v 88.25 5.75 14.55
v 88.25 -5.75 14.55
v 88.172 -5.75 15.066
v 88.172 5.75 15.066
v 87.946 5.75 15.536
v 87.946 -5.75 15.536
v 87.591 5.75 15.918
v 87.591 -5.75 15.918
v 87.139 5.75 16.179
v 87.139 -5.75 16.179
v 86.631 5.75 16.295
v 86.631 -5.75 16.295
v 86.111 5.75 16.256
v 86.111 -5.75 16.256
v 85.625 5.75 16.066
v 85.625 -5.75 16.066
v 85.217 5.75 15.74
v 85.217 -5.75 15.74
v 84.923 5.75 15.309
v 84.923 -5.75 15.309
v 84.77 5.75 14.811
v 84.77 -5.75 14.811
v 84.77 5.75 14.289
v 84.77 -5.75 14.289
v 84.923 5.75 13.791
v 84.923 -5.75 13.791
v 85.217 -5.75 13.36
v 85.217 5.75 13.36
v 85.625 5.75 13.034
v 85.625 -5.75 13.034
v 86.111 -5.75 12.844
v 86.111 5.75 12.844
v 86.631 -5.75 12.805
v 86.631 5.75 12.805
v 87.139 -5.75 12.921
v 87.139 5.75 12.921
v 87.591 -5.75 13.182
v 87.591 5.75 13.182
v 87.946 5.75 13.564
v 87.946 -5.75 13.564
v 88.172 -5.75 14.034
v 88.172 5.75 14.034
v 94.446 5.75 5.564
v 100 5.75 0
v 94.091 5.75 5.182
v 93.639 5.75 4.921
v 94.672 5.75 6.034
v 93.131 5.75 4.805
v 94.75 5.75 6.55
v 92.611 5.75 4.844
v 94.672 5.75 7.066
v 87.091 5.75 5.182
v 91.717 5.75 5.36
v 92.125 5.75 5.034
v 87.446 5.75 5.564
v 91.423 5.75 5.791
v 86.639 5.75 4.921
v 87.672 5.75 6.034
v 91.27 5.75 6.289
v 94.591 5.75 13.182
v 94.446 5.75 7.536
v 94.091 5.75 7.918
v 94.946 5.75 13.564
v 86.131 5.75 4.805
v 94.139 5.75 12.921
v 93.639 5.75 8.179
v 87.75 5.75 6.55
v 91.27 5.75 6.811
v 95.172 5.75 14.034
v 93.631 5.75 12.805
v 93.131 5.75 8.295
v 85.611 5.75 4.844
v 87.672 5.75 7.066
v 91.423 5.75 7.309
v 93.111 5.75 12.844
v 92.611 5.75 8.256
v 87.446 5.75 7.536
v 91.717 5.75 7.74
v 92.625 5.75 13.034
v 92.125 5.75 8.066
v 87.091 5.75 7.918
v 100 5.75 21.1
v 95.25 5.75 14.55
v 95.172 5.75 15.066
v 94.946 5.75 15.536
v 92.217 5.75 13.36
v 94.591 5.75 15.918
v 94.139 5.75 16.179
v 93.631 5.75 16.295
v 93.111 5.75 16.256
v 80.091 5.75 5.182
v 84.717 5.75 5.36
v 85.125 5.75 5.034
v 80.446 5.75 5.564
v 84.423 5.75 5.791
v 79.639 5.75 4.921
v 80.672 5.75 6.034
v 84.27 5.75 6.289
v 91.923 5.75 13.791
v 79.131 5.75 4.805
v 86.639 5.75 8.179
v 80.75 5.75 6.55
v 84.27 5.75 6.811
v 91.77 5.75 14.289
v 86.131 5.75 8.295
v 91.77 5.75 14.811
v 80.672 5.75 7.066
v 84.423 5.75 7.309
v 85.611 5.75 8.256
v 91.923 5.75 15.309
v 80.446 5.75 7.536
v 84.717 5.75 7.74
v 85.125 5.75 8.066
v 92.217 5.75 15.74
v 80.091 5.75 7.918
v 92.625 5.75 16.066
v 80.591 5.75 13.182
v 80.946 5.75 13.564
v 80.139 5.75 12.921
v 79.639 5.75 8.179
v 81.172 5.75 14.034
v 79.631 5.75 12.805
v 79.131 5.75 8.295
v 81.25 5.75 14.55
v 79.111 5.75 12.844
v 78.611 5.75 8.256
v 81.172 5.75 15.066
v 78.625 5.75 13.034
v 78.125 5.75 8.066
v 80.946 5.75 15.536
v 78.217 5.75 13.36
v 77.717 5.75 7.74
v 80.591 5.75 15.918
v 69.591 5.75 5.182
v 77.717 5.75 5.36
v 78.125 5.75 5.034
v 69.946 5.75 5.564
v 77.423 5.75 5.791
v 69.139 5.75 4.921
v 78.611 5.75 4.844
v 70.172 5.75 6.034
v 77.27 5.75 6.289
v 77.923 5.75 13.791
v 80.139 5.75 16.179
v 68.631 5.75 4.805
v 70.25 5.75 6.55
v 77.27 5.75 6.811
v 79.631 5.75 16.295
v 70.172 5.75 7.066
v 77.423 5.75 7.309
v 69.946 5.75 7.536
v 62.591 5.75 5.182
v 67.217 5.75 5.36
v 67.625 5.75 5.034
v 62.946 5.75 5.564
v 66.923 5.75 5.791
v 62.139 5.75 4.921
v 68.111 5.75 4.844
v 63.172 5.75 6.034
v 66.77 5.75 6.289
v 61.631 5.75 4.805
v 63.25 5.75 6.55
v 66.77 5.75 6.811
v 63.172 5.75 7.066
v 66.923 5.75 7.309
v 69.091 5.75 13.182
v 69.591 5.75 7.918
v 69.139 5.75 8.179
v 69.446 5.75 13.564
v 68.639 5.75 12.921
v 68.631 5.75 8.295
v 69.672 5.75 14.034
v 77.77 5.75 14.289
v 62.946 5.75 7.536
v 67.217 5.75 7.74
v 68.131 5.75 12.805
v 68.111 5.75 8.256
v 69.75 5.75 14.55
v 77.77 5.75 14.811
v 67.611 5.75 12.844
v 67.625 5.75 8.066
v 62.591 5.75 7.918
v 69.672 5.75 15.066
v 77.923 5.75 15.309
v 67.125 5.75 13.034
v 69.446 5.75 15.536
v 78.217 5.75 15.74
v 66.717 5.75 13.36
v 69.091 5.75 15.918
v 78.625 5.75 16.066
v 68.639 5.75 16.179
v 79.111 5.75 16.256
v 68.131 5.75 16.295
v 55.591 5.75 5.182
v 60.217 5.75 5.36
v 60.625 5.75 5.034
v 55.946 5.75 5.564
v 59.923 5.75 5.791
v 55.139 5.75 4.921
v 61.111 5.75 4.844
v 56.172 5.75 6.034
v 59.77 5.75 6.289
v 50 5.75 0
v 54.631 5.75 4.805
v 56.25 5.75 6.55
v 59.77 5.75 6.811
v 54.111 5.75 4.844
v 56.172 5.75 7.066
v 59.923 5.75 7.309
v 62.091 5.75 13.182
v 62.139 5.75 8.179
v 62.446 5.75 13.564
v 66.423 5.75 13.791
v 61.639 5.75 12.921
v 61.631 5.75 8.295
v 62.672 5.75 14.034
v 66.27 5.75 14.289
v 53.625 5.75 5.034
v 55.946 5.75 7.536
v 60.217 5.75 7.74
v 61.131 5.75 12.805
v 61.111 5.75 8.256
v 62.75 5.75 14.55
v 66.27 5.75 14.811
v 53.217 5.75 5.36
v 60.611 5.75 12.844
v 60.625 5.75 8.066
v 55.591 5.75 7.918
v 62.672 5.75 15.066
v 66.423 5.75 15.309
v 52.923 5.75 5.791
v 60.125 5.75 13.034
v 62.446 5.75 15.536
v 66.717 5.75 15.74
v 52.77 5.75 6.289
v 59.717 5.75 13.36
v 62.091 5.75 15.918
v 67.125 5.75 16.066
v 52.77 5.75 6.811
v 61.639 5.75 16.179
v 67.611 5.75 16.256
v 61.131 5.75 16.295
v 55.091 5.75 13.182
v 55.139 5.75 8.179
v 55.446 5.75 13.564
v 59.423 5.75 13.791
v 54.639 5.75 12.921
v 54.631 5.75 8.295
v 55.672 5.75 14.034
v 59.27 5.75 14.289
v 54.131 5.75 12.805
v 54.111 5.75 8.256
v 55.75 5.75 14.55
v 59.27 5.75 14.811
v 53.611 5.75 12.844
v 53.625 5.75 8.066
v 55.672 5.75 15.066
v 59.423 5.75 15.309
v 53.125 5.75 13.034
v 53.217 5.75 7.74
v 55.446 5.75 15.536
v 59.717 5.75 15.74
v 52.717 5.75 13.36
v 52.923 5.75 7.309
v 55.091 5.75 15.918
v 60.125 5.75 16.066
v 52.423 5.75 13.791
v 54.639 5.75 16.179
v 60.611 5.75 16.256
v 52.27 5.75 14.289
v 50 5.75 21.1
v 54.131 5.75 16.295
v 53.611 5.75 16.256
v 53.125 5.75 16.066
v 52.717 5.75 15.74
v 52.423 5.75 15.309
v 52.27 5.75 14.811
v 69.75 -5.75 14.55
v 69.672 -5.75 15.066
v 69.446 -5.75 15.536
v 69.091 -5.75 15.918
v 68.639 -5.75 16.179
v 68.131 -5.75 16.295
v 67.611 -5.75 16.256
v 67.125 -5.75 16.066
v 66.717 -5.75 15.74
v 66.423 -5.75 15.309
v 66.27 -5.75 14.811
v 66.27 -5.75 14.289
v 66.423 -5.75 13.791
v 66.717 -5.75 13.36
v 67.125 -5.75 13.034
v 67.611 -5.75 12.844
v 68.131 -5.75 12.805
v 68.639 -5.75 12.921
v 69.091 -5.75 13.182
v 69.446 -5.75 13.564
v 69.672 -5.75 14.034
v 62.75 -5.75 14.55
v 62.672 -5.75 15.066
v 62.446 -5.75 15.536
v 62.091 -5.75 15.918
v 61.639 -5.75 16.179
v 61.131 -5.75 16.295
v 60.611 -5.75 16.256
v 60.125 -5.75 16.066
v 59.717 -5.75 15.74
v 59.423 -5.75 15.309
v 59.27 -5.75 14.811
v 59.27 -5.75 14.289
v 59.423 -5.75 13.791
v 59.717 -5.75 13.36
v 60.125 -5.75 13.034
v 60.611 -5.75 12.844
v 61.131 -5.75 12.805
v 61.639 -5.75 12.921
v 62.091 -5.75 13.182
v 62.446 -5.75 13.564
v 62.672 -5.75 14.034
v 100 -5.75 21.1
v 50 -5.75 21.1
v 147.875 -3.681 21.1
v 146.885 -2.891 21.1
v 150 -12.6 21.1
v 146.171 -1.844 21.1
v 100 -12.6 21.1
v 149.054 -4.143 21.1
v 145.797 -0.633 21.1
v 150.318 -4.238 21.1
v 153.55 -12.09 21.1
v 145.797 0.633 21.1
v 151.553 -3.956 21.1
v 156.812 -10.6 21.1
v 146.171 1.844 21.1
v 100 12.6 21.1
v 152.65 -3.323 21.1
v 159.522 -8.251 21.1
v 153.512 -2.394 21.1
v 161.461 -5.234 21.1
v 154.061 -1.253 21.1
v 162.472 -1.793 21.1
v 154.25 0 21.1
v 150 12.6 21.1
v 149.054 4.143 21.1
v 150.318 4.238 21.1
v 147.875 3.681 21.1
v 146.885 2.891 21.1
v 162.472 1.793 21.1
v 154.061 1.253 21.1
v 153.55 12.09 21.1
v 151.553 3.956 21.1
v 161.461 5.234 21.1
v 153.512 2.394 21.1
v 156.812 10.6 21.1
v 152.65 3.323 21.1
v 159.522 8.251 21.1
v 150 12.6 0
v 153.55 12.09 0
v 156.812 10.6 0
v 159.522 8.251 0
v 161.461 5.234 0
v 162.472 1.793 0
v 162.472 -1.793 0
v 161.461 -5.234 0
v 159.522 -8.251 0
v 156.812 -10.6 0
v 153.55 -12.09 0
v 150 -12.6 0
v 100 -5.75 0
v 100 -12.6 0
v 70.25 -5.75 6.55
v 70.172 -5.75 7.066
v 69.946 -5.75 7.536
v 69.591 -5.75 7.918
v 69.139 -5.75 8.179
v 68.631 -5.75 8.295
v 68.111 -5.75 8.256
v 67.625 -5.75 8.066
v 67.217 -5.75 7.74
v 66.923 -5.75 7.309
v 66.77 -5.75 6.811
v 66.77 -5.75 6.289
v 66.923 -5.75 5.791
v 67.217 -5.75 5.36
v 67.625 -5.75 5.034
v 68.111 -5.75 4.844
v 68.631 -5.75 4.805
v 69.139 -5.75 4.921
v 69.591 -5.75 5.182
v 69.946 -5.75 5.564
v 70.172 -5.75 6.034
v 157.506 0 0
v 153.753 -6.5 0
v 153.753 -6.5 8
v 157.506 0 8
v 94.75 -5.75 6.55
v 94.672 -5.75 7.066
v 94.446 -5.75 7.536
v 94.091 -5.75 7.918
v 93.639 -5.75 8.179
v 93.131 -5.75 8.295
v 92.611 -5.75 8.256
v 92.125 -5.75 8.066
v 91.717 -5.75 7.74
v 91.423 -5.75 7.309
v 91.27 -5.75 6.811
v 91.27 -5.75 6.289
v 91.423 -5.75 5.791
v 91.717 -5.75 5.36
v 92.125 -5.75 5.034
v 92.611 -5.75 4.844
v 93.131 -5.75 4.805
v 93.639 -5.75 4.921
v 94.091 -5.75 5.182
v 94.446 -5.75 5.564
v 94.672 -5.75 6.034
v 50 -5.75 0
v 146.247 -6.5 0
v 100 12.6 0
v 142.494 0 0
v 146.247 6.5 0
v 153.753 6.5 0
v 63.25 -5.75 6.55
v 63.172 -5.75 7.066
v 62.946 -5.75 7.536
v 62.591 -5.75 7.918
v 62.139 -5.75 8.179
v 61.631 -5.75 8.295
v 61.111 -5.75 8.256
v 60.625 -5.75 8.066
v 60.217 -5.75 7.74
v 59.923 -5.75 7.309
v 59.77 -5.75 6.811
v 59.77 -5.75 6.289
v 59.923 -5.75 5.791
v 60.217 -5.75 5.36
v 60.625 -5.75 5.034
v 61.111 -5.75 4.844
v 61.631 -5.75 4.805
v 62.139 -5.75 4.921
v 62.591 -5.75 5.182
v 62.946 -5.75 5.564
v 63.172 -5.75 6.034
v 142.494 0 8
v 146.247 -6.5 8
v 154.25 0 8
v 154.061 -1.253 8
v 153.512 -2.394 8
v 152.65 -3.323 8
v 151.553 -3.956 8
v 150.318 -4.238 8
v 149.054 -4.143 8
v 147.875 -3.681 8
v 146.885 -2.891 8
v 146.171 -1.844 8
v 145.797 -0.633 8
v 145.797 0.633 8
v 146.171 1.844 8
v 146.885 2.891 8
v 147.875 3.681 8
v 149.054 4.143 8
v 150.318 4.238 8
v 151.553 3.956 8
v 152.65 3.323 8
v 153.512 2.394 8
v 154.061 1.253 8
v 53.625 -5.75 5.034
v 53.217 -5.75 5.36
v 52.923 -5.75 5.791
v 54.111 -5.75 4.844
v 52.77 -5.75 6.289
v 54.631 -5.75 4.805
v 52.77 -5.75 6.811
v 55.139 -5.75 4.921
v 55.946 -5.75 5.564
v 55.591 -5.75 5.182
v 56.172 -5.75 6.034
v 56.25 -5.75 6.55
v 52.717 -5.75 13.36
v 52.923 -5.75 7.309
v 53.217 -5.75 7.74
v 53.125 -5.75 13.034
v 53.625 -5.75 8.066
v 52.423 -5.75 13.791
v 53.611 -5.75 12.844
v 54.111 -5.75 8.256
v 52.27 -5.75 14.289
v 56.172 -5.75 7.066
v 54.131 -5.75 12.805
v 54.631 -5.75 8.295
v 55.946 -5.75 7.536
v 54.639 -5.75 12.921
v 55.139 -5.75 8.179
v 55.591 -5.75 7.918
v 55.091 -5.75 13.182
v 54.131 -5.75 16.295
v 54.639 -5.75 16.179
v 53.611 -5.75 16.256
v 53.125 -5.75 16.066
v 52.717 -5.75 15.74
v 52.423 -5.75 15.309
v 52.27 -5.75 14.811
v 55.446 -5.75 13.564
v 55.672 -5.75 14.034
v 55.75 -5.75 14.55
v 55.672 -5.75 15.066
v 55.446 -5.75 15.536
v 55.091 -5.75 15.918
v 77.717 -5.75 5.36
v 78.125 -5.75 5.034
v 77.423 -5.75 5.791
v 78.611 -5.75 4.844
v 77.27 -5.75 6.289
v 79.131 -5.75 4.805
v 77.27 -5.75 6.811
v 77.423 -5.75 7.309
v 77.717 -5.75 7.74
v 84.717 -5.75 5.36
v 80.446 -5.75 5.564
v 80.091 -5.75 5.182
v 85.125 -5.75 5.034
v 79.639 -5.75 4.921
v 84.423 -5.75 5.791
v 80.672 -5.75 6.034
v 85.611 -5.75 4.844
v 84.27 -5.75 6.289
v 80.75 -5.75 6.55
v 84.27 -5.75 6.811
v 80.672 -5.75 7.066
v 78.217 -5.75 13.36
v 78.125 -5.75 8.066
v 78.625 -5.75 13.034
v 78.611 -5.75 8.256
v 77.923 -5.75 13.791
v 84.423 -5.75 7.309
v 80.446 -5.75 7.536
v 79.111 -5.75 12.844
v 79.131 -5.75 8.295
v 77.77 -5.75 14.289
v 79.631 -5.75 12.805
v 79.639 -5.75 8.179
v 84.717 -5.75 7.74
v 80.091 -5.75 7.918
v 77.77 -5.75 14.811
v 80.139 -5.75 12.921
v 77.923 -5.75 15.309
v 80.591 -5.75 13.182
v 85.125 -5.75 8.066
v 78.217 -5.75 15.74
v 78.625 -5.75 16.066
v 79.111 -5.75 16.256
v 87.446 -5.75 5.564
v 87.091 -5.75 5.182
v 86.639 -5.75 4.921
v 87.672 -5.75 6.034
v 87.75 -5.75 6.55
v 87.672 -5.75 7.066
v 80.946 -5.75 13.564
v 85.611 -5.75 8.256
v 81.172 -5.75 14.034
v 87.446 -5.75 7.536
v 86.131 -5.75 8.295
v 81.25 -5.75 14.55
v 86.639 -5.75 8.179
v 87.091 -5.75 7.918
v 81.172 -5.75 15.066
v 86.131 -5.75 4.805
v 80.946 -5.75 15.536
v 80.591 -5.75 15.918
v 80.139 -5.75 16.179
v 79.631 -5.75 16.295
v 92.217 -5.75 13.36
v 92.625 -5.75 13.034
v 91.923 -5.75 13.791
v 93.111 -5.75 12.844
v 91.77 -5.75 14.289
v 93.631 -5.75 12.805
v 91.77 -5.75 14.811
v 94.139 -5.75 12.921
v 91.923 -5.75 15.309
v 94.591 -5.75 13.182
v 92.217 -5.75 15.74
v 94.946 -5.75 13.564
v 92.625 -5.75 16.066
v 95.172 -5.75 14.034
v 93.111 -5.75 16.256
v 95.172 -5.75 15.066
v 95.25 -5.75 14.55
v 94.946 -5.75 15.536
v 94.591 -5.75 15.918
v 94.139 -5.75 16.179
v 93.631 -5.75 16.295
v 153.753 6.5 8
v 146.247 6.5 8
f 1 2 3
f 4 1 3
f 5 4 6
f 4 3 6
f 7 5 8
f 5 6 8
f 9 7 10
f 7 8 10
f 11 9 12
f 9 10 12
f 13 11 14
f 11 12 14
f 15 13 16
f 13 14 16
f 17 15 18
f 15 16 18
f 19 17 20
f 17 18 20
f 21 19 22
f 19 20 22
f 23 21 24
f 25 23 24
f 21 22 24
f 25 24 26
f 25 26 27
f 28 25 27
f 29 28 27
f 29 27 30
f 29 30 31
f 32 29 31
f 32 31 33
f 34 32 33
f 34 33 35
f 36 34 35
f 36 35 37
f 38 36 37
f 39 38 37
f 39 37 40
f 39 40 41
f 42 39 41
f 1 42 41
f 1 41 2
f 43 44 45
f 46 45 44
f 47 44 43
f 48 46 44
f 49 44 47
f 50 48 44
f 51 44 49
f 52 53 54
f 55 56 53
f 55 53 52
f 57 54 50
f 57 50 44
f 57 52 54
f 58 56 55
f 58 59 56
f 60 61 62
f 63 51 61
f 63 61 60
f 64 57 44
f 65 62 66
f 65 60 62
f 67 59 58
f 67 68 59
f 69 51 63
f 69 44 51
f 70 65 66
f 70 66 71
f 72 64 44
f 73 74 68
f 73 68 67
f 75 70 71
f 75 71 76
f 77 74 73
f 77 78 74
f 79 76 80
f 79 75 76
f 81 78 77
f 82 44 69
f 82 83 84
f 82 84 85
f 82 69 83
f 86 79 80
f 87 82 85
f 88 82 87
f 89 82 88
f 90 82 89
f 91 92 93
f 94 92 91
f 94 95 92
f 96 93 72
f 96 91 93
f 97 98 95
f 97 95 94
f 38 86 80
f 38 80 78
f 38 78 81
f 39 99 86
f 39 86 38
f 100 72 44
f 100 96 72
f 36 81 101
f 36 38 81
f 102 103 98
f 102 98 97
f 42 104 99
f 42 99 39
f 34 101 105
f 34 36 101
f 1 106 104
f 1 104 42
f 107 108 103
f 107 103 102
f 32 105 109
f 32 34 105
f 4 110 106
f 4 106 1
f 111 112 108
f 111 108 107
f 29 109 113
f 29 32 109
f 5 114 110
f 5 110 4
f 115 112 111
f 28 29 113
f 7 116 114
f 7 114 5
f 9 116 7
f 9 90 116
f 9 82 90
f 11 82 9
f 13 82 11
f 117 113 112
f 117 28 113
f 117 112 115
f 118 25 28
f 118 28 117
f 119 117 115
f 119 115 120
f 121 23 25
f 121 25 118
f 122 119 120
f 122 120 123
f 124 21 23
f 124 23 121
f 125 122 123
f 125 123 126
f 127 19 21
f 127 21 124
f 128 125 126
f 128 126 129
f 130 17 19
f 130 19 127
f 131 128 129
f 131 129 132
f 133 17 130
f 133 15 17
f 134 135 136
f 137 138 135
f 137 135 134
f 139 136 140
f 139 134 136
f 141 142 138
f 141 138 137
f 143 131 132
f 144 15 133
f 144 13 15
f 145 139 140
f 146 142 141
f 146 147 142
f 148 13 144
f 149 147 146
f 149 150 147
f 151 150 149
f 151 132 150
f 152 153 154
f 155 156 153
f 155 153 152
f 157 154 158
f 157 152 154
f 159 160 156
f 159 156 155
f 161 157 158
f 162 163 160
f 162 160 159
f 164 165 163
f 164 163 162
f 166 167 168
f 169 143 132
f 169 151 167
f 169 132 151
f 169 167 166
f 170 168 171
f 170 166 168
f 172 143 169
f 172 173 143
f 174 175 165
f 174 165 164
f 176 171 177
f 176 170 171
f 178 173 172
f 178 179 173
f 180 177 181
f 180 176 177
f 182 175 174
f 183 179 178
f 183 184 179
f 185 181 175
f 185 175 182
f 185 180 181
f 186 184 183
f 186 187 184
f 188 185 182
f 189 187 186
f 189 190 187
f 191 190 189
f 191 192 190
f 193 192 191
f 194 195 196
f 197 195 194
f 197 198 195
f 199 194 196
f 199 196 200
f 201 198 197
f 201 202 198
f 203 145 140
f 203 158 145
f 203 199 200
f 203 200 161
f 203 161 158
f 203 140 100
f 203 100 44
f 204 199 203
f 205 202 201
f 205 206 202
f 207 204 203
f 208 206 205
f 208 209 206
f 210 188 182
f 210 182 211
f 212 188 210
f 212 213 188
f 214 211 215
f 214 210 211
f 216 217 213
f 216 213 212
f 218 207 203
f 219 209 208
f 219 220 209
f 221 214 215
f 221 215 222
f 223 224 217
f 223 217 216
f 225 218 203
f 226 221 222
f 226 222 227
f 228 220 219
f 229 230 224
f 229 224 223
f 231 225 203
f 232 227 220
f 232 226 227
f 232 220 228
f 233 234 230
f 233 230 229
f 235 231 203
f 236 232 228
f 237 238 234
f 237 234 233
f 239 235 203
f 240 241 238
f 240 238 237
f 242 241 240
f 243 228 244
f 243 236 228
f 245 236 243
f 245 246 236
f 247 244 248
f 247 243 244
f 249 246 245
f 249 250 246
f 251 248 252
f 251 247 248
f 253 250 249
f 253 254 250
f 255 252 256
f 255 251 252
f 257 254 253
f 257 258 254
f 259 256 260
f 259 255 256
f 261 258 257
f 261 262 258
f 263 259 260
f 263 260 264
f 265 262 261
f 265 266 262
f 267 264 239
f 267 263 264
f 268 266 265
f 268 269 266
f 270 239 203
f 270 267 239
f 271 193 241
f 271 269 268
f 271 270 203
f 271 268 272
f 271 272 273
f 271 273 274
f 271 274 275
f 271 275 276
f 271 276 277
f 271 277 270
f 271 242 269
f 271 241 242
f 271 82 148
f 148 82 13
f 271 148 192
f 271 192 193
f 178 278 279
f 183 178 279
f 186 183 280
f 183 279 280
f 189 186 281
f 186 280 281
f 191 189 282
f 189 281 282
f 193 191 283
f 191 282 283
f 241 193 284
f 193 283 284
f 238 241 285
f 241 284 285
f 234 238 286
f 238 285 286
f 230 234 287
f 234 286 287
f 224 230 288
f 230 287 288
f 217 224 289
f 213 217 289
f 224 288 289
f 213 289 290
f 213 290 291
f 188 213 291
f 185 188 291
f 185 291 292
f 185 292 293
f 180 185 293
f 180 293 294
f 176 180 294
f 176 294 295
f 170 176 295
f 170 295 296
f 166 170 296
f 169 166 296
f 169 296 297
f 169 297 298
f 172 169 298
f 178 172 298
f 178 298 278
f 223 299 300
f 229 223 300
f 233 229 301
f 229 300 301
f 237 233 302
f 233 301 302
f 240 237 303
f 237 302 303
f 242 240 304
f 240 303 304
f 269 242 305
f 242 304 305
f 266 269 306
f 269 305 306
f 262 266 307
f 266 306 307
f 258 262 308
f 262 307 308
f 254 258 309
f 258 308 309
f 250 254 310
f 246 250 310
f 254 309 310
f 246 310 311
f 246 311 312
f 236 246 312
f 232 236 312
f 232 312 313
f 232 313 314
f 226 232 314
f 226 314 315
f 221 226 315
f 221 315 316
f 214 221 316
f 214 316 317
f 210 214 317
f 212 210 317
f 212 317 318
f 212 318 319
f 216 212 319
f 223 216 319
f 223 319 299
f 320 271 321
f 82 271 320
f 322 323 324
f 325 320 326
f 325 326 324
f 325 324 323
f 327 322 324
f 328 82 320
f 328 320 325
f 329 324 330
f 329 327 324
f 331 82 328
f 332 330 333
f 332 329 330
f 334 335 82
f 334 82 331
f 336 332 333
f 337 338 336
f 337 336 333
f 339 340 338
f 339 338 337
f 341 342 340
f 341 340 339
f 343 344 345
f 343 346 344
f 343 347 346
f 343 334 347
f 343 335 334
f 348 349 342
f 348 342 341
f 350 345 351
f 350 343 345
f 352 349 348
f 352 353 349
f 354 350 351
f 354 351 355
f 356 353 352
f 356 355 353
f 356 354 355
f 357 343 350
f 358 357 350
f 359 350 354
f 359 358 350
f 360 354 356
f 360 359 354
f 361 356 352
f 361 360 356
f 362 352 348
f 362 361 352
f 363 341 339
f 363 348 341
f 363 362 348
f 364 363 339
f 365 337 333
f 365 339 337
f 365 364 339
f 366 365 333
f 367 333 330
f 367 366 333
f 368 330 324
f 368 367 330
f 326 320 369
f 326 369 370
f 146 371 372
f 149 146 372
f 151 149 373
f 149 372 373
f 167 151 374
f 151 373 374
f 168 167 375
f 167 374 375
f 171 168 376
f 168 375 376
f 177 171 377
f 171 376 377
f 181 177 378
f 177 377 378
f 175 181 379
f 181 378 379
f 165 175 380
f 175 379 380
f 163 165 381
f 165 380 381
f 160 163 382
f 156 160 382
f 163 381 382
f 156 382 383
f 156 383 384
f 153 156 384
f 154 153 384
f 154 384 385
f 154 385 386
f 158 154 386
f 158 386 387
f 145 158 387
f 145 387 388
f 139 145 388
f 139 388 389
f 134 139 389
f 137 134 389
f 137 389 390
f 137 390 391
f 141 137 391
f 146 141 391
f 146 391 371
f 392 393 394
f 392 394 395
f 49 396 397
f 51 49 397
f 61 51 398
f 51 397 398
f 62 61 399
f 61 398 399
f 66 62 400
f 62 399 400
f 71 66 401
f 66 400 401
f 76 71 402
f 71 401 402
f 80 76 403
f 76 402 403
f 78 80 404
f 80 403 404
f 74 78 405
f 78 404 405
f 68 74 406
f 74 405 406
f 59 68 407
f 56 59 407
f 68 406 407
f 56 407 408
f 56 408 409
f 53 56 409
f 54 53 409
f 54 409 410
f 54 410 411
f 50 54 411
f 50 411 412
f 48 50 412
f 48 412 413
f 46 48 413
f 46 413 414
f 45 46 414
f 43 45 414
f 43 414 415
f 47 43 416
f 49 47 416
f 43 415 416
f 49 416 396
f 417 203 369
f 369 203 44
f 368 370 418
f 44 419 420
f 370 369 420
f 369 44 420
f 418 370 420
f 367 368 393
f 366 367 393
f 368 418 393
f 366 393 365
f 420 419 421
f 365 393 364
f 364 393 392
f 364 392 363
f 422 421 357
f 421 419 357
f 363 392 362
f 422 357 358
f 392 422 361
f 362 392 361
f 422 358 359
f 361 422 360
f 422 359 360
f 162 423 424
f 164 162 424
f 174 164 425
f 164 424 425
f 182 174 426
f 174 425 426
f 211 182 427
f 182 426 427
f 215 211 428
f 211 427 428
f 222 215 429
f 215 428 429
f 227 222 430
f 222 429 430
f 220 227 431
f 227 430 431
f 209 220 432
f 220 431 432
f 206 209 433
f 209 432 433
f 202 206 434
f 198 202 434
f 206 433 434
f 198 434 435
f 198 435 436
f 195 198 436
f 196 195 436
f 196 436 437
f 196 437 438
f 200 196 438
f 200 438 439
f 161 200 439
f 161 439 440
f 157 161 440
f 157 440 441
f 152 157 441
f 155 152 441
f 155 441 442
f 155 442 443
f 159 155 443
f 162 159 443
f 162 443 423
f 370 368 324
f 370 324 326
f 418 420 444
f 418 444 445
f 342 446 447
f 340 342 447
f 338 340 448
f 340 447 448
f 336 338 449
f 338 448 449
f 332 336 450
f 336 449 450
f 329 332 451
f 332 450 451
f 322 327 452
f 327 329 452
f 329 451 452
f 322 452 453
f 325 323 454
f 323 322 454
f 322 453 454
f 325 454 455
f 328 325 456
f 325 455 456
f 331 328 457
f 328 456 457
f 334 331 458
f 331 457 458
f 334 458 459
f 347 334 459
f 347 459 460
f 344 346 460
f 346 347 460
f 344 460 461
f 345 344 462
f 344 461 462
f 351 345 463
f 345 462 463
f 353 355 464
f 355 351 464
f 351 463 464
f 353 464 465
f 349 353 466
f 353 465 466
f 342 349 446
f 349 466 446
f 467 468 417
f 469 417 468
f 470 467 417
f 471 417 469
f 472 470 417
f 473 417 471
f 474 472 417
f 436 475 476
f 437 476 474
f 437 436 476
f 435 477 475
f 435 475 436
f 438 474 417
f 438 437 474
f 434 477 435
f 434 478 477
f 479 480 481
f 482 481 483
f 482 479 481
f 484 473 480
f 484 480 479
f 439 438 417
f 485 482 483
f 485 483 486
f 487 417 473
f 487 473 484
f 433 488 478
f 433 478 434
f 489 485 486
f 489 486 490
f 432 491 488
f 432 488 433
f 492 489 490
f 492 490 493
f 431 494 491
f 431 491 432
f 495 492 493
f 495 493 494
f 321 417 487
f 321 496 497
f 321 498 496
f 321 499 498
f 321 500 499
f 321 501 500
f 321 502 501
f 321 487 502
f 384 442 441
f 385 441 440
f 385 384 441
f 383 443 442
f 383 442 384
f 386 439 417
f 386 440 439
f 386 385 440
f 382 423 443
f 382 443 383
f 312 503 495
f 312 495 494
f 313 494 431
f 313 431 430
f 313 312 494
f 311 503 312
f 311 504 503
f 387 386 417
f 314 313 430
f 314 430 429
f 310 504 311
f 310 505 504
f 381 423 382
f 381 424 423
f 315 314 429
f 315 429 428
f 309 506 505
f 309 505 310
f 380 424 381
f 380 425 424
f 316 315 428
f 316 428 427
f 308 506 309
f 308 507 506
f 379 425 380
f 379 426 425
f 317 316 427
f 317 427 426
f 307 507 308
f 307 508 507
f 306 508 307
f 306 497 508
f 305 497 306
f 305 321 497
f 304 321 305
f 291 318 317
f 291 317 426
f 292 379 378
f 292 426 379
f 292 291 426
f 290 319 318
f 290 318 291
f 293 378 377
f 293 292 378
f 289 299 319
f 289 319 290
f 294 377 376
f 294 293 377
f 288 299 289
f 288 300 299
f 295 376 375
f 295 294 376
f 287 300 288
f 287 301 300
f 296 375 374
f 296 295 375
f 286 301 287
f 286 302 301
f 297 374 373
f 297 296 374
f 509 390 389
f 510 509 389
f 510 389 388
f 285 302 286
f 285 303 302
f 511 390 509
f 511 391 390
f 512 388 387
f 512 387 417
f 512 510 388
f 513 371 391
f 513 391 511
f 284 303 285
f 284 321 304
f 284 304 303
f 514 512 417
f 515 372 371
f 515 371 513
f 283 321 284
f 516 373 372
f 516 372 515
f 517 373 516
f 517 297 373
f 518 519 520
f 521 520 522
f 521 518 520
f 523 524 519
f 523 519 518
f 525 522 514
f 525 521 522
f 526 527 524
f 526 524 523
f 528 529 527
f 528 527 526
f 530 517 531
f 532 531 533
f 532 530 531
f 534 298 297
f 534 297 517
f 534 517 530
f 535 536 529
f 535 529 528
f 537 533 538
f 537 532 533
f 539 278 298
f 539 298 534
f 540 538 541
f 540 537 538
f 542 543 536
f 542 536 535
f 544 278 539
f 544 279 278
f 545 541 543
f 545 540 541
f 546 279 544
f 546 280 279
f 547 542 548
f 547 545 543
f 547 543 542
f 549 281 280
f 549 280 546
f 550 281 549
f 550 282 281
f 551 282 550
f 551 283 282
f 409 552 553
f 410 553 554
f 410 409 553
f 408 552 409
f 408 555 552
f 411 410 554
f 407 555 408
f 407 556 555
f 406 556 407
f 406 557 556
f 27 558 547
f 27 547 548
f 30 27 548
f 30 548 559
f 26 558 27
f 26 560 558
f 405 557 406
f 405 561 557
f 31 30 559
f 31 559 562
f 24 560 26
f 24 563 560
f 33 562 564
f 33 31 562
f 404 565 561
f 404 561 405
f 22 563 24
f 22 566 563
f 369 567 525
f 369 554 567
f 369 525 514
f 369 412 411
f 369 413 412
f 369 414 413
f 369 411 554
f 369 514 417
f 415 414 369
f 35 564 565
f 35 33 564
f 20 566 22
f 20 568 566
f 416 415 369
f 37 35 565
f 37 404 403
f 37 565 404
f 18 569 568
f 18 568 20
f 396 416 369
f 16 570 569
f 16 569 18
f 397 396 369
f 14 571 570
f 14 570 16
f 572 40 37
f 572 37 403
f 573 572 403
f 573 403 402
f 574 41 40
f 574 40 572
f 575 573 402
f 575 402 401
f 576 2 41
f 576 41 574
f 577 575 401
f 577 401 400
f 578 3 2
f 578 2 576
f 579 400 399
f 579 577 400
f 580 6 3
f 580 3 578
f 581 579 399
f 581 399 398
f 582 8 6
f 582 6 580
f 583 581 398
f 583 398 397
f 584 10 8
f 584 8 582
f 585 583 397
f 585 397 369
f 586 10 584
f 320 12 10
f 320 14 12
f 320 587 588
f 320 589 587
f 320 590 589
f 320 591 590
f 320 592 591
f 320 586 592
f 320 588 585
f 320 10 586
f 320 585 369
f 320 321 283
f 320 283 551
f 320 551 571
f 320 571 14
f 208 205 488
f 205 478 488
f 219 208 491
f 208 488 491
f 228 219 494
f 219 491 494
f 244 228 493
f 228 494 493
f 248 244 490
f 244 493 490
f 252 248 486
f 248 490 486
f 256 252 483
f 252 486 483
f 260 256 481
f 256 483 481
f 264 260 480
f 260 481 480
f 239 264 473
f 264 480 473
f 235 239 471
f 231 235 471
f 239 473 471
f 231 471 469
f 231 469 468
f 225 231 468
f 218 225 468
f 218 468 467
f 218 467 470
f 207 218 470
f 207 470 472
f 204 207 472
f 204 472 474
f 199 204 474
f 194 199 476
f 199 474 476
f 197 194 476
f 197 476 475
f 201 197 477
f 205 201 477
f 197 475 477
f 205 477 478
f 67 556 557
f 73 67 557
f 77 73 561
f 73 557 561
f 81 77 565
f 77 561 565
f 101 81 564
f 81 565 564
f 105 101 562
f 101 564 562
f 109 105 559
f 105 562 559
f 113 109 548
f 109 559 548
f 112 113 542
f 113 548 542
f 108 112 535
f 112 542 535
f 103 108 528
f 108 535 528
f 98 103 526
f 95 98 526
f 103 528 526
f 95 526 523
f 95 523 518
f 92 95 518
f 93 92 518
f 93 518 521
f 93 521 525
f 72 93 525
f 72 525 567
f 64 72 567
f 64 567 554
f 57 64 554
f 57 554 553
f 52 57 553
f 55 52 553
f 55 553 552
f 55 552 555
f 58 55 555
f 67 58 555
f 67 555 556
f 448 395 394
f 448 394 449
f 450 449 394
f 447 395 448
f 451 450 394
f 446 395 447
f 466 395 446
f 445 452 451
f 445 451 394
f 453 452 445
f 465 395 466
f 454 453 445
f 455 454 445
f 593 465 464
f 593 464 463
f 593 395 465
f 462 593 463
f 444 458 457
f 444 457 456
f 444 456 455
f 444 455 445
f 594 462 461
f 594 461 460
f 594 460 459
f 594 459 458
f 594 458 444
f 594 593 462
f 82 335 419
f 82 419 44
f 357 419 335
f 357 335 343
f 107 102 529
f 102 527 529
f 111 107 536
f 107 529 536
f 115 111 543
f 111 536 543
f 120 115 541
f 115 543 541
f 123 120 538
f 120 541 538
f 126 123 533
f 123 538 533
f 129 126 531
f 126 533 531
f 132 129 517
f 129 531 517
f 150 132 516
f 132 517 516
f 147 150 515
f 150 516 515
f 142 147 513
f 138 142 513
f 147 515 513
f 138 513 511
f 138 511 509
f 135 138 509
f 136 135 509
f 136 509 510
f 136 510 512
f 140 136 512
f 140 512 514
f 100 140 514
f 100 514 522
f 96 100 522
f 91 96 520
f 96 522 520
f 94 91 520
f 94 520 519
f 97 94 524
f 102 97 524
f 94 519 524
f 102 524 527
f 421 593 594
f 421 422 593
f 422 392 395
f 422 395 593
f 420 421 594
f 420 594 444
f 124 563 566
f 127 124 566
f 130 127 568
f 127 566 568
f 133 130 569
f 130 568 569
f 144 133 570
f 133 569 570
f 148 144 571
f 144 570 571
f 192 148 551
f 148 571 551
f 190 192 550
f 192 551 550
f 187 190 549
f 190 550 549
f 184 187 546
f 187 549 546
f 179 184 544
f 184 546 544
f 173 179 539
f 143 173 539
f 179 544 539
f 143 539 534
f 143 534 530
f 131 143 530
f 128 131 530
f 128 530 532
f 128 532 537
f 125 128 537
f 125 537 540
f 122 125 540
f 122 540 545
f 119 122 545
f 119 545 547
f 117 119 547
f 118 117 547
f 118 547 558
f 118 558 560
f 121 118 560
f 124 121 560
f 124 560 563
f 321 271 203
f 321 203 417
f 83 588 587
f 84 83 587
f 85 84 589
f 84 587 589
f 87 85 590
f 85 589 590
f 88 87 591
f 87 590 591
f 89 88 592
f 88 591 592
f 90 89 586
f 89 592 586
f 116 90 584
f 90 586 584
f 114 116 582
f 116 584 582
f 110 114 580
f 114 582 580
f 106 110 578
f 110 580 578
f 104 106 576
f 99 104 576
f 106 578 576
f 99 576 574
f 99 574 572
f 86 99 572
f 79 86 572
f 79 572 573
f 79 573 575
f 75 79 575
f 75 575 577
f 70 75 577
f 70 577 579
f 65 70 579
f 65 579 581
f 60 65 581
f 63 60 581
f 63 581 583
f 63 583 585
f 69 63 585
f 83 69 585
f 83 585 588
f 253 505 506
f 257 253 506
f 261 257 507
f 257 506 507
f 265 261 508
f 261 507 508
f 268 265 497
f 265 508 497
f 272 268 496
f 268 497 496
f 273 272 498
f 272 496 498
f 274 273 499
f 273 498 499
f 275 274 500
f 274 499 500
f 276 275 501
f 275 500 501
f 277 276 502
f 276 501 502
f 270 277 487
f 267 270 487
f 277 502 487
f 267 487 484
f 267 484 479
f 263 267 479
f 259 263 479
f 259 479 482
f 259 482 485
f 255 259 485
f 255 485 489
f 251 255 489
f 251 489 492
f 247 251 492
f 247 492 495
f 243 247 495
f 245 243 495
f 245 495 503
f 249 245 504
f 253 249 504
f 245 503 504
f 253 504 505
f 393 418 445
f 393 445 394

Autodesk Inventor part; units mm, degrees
ref_plane "YZ Plane" through (0, 0, 0) normal (1, 0, 0) x (0, 1, 0)
ref_plane "XZ Plane" through (0, 0, 0) normal (0, 1, 0) x (-1, 0, 0)
ref_plane "XY Plane" through (0, 0, 0) normal (0, 0, 1) x (1, 0, 0)
sketch "Sketch1" plane through (0, 0, 0) normal (0, 0, 1) x (1, 0, 0)
  line L0 (0, 12.6) -> (150, 12.6)
  arc A0 (150, -12.6) -> (150, 12.6) centre (150, 0) ccw
  line L1 (150, -12.6) -> (0, -12.6)
  arc A1 (0, 12.6) -> (0, -12.6) centre (0, 0) ccw
  circle A2 centre (0, 0) radius 7.5
  circle A3 centre (150, 0) radius 4.25
  dimension "d0" = 150
  dimension "d2" = 12.6
  dimension "d3" = 15
  dimension "d4" = 8.5
extrude "Extrusion1" add sketch "Sketch1" along normal blind 21.1
sketch "Sketch2" plane through (0, 0, 21.1) normal (0, 0, 1) x (1, 0, 0)
  circle A0 centre (0, 0) radius 7.5 projected
  arc A1 (0, 12.6) -> (0, -12.6) centre (0, 0) ccw projected
  circle A2 centre (0, 0) radius 11
  dimension "d7" = 22
extrude "Extrusion2" cut sketch "Sketch2" against normal blind 7
sketch "Sketch4" plane through (0, 0, 21.1) normal (0, 0, 1) x (1, 0, 0)
  circle A0 centre (0, 0) radius 11 projected
  circle A1 centre (20, 0) radius 1.75
  circle A2 centre (40, 0) radius 1.75
  dimension "d16" = 20
  dimension "d17" = 40
  dimension "d23" = 3.5
extrude "Extrusion3" cut sketch "Sketch4" against normal through all contours A1 | A2
sketch "Sketch5" plane through (0, 0, 21.1) normal (0, 0, 1) x (1, 0, 0)
  circle A0 centre (20, 0) radius 1.75 projected
  circle A1 centre (40, 0) radius 1.75 projected
  circle A2 centre (40, 0) radius 3
  circle A3 centre (20, 0) radius 3
  dimension "d28" = 6
extrude "Extrusion4" cut sketch "Sketch5" against normal blind 3
sketch "Sketch6" plane through (0, 0, 21.1) normal (0, 0, 1) x (1, 0, 0)
  line L0 (150, 12.6) -> (0, 12.6) projected
  arc A0 (0, 12.6) -> (0, -12.6) centre (0, 0) ccw projected
  line L1 (0, -12.6) -> (150, -12.6) projected
  arc A1 (12.1445, 12.6) -> (12.1445, -12.6) centre (0, 0) ccw
  dimension "d24" = 35
extrude "Extrusion5" add sketch "Sketch6" against normal up to surface (21.1 mm away)
fillet "Fillet1" radius 3.5 1 edges at (-7.5, 0, 14.1)
sketch "Sketch8" plane through (0, 0, 21.1) normal (0, 0, 1) x (1, 0, 0)
  circle A0 centre (150, 0) radius 7
  line L0 (150, 12.6) -> (12.1445, 12.6)
  arc A1 (12.1445, 12.6) -> (12.1445, -12.6) centre (0, 0) ccw
  line L1 (12.1445, -12.6) -> (150, -12.6)
  line L2 (100, 12.6) -> (100, 5.75)
  line L3 (100, 5.75) -> (50, 5.75)
  line L4 (50, 5.75) -> (50, -5.75)
  line L5 (50, -5.75) -> (100, -5.75)
  line L6 (100, -5.75) -> (100, -12.6)
  circle A2 centre (40, 0) radius 3 projected
  circle A3 centre (20, 0) radius 3 projected
  circle A4 centre (0, 0) radius 11 projected
  circle A5 centre (150, 0) radius 4.25 projected
  line L7 (150, 12.6) -> (12.1445, 12.6) projected
  arc A6 (12.1445, 12.6) -> (12.1445, -12.6) centre (0, 0) ccw projected
  line L8 (12.1445, -12.6) -> (150, -12.6) projected
  arc A7 (150, -12.6) -> (150, 12.6) centre (150, 0) ccw projected
  dimension "d35" = 50
  dimension "d36" = 50
  dimension "d37" = 11.5
extrude "Extrusion7" cut sketch "Sketch8" against normal through all contours L2 L3 L4 L5 L6 L1 A1 L0 | A2 | A3 | A4
sketch "Sketch9" plane through (50, -5.75, 21.1) normal (0, -1, 0) x (1, 0, 0)
  line L0 (0, 0) -> (0, -21.1) projected
  line L1 (4.5, -6.55) -> (12.5, -6.55) construction
  line L2 (12.5, -6.55) -> (12.5, -14.55) construction
  line L3 (12.5, -14.55) -> (4.5, -14.55) construction
  line L4 (4.5, -14.55) -> (4.5, -6.55) construction
  line L5 (12.5, -14.55) -> (20.5, -14.55) construction
  line L6 (20.5, -14.55) -> (20.5, -6.55) construction
  line L7 (20.5, -6.55) -> (12.5, -6.55) construction
  line L8 (12.5, -6.55) -> (12.5, -14.55) construction
  circle A0 centre (4.5, -14.55) radius 1.75
  circle A1 centre (4, -6.55) radius 1.75
  circle A2 centre (11.5, -14.55) radius 1.75
  circle A3 centre (11, -6.55) radius 1.75
  circle A4 centre (18.5, -14.55) radius 1.75
  circle A5 centre (18, -6.55) radius 1.75
  line L9 (29.5, -6.55) -> (37.5, -6.55) construction
  line L10 (37.5, -6.55) -> (37.5, -14.55) construction
  line L11 (37.5, -14.55) -> (29.5, -14.55) construction
  line L12 (29.5, -14.55) -> (29.5, -6.55) construction
  line L13 (37.5, -14.55) -> (45.5, -14.55) construction
  line L14 (45.5, -14.55) -> (45.5, -6.55) construction
  line L15 (45.5, -6.55) -> (37.5, -6.55) construction
  line L16 (37.5, -6.55) -> (37.5, -14.55) construction
  circle A6 centre (29.5, -6.55) radius 1.75
  circle A7 centre (29, -14.55) radius 1.75
  circle A8 centre (36.5, -6.55) radius 1.75
  circle A9 centre (36, -14.55) radius 1.75
  circle A10 centre (43.5, -6.55) radius 1.75
  circle A11 centre (43, -14.55) radius 1.75
  point P0 (-50, -21.1)
  point P1 (0, -10.55)
  point P2 (12.5, -10.55)
  point P3 (12.5, -10.55)
  point P4 (37.5, -10.55)
  dimension "d40" = 12.5
  dimension "d41" = 8
  dimension "d42" = 0.5
  dimension "d43" = 1
  dimension "d44" = 1.5
  dimension "d45" = 2
  dimension "d46" = 2.5
  dimension "d47" = 3.5
  dimension "d48" = 25
  dimension "d49" = 0.5
  dimension "d50" = 1
  dimension "d51" = 1.5
  dimension "d52" = 2
  dimension "d53" = 2.5
extrude "Extrusion8" cut sketch "Sketch9" against normal through all
sketch "Sketch10" plane through (0, 0, 0) normal (0, 0, -1) x (-1, 0, 0)
  circle A0 centre (-150, 0) radius 4.25 projected
  line L0 (-157.5056, 0) -> (-153.7528, 6.5)
  line L1 (-153.7528, 6.5) -> (-146.2472, 6.5)
  line L2 (-146.2472, 6.5) -> (-142.4944, 0)
  line L3 (-142.4944, 0) -> (-146.2472, -6.5)
  line L4 (-146.2472, -6.5) -> (-153.7528, -6.5)
  line L5 (-153.7528, -6.5) -> (-157.5056, 0)
  point P0 (0, 0)
  dimension "d56" = 13
extrude "Extrusion9" cut sketch "Sketch10" against normal blind 8
properties part number "thin arm2_2"
